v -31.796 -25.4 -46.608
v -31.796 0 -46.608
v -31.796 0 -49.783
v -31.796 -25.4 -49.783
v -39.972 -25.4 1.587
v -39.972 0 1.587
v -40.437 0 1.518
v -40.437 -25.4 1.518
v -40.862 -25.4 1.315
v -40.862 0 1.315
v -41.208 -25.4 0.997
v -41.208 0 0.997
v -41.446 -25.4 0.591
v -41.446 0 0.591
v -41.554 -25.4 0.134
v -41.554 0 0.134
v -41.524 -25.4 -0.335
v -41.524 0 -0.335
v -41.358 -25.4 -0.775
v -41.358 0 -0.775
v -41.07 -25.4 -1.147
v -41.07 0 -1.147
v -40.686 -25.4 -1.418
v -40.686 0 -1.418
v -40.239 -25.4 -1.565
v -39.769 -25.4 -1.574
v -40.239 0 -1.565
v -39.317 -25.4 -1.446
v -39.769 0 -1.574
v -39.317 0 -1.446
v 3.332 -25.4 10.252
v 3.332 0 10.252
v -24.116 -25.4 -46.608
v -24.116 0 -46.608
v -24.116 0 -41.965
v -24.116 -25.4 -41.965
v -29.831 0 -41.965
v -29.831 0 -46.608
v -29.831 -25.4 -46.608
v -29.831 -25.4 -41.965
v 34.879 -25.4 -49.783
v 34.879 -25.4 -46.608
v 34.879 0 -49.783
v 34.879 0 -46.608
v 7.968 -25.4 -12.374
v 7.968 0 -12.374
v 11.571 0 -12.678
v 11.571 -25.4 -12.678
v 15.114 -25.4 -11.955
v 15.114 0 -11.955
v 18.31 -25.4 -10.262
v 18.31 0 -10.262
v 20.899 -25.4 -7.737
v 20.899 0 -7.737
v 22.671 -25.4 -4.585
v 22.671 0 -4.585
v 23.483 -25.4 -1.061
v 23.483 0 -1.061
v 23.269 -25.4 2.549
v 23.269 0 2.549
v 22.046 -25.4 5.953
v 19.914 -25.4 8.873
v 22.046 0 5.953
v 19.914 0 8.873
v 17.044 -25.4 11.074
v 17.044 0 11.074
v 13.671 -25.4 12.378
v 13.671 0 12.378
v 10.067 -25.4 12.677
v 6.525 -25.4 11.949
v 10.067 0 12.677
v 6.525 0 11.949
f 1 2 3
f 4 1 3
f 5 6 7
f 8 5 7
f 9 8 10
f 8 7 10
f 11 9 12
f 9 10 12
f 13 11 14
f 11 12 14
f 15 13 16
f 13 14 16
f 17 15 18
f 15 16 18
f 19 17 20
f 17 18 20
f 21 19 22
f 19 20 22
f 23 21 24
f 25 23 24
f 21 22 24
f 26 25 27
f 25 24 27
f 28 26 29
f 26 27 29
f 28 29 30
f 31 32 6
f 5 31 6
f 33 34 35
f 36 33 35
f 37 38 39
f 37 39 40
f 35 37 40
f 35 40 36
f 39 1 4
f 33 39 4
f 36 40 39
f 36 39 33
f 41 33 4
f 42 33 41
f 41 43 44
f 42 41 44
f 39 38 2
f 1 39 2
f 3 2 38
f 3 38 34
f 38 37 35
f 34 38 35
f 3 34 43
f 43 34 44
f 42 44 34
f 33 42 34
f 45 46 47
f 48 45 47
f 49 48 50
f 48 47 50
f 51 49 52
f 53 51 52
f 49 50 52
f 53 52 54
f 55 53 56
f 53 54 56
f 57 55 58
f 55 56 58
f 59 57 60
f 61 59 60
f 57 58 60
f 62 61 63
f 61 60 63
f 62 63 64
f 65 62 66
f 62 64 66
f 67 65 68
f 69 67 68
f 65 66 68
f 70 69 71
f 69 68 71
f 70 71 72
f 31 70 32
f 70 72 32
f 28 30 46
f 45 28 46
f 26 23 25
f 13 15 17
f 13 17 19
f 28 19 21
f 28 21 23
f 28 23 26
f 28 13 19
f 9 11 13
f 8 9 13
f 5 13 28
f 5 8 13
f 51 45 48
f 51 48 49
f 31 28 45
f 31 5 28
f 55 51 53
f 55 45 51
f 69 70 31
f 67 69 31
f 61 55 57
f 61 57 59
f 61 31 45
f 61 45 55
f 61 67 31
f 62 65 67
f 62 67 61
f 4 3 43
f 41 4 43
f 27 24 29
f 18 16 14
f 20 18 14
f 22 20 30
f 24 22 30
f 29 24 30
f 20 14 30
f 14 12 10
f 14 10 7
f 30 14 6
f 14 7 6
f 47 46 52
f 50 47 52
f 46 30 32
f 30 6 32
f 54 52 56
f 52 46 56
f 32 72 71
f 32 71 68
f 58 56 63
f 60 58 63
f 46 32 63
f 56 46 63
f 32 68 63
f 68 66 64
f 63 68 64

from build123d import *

# Parameters (mm, degrees)
F0_W     = 5.715
F0_H     = 4.642638
F1_DEPTH = 25.4


with BuildPart() as f1:
    # F0 (on Front) → F1 (new body)
    with BuildSketch(Plane.XZ):
        Polygon((-29.830527, -46.607873), (-31.795876, -46.607873), (-31.795876, -49.782873), (34.879124, -49.782873), (34.879124, -46.607873), (-24.115527, -46.607873), align=None)
        with Locations((-26.973027, -44.286554)):
            Rectangle(F0_W, F0_H)
        with BuildLine():
            ThreePointArc((-39.972443, 1.5875), (-41.524111, -0.335385), (-39.316813, -1.445789))
            ThreePointArc((-39.316813, -1.445789), (-38.638095, -0.860042), (-38.384943, 0))
            ThreePointArc((-38.384943, 0), (-38.849911, 1.122532), (-39.972443, 1.5875))
        make_face()
        with BuildLine():
            Line((-39.316813, -1.445789), (7.967813, -12.373838))
            ThreePointArc((7.967813, -12.373838), (23.269036, 2.54943), (3.33151, 10.251794))
            Line((3.33151, 10.251794), (-39.972443, 1.5875))
            ThreePointArc((-39.972443, 1.5875), (-38.849911, 1.122532), (-38.384943, 0))
            ThreePointArc((-38.384943, 0), (-38.638095, -0.860042), (-39.316813, -1.445789))
        make_face()
    extrude(amount=F1_DEPTH)


solid = f1.part
